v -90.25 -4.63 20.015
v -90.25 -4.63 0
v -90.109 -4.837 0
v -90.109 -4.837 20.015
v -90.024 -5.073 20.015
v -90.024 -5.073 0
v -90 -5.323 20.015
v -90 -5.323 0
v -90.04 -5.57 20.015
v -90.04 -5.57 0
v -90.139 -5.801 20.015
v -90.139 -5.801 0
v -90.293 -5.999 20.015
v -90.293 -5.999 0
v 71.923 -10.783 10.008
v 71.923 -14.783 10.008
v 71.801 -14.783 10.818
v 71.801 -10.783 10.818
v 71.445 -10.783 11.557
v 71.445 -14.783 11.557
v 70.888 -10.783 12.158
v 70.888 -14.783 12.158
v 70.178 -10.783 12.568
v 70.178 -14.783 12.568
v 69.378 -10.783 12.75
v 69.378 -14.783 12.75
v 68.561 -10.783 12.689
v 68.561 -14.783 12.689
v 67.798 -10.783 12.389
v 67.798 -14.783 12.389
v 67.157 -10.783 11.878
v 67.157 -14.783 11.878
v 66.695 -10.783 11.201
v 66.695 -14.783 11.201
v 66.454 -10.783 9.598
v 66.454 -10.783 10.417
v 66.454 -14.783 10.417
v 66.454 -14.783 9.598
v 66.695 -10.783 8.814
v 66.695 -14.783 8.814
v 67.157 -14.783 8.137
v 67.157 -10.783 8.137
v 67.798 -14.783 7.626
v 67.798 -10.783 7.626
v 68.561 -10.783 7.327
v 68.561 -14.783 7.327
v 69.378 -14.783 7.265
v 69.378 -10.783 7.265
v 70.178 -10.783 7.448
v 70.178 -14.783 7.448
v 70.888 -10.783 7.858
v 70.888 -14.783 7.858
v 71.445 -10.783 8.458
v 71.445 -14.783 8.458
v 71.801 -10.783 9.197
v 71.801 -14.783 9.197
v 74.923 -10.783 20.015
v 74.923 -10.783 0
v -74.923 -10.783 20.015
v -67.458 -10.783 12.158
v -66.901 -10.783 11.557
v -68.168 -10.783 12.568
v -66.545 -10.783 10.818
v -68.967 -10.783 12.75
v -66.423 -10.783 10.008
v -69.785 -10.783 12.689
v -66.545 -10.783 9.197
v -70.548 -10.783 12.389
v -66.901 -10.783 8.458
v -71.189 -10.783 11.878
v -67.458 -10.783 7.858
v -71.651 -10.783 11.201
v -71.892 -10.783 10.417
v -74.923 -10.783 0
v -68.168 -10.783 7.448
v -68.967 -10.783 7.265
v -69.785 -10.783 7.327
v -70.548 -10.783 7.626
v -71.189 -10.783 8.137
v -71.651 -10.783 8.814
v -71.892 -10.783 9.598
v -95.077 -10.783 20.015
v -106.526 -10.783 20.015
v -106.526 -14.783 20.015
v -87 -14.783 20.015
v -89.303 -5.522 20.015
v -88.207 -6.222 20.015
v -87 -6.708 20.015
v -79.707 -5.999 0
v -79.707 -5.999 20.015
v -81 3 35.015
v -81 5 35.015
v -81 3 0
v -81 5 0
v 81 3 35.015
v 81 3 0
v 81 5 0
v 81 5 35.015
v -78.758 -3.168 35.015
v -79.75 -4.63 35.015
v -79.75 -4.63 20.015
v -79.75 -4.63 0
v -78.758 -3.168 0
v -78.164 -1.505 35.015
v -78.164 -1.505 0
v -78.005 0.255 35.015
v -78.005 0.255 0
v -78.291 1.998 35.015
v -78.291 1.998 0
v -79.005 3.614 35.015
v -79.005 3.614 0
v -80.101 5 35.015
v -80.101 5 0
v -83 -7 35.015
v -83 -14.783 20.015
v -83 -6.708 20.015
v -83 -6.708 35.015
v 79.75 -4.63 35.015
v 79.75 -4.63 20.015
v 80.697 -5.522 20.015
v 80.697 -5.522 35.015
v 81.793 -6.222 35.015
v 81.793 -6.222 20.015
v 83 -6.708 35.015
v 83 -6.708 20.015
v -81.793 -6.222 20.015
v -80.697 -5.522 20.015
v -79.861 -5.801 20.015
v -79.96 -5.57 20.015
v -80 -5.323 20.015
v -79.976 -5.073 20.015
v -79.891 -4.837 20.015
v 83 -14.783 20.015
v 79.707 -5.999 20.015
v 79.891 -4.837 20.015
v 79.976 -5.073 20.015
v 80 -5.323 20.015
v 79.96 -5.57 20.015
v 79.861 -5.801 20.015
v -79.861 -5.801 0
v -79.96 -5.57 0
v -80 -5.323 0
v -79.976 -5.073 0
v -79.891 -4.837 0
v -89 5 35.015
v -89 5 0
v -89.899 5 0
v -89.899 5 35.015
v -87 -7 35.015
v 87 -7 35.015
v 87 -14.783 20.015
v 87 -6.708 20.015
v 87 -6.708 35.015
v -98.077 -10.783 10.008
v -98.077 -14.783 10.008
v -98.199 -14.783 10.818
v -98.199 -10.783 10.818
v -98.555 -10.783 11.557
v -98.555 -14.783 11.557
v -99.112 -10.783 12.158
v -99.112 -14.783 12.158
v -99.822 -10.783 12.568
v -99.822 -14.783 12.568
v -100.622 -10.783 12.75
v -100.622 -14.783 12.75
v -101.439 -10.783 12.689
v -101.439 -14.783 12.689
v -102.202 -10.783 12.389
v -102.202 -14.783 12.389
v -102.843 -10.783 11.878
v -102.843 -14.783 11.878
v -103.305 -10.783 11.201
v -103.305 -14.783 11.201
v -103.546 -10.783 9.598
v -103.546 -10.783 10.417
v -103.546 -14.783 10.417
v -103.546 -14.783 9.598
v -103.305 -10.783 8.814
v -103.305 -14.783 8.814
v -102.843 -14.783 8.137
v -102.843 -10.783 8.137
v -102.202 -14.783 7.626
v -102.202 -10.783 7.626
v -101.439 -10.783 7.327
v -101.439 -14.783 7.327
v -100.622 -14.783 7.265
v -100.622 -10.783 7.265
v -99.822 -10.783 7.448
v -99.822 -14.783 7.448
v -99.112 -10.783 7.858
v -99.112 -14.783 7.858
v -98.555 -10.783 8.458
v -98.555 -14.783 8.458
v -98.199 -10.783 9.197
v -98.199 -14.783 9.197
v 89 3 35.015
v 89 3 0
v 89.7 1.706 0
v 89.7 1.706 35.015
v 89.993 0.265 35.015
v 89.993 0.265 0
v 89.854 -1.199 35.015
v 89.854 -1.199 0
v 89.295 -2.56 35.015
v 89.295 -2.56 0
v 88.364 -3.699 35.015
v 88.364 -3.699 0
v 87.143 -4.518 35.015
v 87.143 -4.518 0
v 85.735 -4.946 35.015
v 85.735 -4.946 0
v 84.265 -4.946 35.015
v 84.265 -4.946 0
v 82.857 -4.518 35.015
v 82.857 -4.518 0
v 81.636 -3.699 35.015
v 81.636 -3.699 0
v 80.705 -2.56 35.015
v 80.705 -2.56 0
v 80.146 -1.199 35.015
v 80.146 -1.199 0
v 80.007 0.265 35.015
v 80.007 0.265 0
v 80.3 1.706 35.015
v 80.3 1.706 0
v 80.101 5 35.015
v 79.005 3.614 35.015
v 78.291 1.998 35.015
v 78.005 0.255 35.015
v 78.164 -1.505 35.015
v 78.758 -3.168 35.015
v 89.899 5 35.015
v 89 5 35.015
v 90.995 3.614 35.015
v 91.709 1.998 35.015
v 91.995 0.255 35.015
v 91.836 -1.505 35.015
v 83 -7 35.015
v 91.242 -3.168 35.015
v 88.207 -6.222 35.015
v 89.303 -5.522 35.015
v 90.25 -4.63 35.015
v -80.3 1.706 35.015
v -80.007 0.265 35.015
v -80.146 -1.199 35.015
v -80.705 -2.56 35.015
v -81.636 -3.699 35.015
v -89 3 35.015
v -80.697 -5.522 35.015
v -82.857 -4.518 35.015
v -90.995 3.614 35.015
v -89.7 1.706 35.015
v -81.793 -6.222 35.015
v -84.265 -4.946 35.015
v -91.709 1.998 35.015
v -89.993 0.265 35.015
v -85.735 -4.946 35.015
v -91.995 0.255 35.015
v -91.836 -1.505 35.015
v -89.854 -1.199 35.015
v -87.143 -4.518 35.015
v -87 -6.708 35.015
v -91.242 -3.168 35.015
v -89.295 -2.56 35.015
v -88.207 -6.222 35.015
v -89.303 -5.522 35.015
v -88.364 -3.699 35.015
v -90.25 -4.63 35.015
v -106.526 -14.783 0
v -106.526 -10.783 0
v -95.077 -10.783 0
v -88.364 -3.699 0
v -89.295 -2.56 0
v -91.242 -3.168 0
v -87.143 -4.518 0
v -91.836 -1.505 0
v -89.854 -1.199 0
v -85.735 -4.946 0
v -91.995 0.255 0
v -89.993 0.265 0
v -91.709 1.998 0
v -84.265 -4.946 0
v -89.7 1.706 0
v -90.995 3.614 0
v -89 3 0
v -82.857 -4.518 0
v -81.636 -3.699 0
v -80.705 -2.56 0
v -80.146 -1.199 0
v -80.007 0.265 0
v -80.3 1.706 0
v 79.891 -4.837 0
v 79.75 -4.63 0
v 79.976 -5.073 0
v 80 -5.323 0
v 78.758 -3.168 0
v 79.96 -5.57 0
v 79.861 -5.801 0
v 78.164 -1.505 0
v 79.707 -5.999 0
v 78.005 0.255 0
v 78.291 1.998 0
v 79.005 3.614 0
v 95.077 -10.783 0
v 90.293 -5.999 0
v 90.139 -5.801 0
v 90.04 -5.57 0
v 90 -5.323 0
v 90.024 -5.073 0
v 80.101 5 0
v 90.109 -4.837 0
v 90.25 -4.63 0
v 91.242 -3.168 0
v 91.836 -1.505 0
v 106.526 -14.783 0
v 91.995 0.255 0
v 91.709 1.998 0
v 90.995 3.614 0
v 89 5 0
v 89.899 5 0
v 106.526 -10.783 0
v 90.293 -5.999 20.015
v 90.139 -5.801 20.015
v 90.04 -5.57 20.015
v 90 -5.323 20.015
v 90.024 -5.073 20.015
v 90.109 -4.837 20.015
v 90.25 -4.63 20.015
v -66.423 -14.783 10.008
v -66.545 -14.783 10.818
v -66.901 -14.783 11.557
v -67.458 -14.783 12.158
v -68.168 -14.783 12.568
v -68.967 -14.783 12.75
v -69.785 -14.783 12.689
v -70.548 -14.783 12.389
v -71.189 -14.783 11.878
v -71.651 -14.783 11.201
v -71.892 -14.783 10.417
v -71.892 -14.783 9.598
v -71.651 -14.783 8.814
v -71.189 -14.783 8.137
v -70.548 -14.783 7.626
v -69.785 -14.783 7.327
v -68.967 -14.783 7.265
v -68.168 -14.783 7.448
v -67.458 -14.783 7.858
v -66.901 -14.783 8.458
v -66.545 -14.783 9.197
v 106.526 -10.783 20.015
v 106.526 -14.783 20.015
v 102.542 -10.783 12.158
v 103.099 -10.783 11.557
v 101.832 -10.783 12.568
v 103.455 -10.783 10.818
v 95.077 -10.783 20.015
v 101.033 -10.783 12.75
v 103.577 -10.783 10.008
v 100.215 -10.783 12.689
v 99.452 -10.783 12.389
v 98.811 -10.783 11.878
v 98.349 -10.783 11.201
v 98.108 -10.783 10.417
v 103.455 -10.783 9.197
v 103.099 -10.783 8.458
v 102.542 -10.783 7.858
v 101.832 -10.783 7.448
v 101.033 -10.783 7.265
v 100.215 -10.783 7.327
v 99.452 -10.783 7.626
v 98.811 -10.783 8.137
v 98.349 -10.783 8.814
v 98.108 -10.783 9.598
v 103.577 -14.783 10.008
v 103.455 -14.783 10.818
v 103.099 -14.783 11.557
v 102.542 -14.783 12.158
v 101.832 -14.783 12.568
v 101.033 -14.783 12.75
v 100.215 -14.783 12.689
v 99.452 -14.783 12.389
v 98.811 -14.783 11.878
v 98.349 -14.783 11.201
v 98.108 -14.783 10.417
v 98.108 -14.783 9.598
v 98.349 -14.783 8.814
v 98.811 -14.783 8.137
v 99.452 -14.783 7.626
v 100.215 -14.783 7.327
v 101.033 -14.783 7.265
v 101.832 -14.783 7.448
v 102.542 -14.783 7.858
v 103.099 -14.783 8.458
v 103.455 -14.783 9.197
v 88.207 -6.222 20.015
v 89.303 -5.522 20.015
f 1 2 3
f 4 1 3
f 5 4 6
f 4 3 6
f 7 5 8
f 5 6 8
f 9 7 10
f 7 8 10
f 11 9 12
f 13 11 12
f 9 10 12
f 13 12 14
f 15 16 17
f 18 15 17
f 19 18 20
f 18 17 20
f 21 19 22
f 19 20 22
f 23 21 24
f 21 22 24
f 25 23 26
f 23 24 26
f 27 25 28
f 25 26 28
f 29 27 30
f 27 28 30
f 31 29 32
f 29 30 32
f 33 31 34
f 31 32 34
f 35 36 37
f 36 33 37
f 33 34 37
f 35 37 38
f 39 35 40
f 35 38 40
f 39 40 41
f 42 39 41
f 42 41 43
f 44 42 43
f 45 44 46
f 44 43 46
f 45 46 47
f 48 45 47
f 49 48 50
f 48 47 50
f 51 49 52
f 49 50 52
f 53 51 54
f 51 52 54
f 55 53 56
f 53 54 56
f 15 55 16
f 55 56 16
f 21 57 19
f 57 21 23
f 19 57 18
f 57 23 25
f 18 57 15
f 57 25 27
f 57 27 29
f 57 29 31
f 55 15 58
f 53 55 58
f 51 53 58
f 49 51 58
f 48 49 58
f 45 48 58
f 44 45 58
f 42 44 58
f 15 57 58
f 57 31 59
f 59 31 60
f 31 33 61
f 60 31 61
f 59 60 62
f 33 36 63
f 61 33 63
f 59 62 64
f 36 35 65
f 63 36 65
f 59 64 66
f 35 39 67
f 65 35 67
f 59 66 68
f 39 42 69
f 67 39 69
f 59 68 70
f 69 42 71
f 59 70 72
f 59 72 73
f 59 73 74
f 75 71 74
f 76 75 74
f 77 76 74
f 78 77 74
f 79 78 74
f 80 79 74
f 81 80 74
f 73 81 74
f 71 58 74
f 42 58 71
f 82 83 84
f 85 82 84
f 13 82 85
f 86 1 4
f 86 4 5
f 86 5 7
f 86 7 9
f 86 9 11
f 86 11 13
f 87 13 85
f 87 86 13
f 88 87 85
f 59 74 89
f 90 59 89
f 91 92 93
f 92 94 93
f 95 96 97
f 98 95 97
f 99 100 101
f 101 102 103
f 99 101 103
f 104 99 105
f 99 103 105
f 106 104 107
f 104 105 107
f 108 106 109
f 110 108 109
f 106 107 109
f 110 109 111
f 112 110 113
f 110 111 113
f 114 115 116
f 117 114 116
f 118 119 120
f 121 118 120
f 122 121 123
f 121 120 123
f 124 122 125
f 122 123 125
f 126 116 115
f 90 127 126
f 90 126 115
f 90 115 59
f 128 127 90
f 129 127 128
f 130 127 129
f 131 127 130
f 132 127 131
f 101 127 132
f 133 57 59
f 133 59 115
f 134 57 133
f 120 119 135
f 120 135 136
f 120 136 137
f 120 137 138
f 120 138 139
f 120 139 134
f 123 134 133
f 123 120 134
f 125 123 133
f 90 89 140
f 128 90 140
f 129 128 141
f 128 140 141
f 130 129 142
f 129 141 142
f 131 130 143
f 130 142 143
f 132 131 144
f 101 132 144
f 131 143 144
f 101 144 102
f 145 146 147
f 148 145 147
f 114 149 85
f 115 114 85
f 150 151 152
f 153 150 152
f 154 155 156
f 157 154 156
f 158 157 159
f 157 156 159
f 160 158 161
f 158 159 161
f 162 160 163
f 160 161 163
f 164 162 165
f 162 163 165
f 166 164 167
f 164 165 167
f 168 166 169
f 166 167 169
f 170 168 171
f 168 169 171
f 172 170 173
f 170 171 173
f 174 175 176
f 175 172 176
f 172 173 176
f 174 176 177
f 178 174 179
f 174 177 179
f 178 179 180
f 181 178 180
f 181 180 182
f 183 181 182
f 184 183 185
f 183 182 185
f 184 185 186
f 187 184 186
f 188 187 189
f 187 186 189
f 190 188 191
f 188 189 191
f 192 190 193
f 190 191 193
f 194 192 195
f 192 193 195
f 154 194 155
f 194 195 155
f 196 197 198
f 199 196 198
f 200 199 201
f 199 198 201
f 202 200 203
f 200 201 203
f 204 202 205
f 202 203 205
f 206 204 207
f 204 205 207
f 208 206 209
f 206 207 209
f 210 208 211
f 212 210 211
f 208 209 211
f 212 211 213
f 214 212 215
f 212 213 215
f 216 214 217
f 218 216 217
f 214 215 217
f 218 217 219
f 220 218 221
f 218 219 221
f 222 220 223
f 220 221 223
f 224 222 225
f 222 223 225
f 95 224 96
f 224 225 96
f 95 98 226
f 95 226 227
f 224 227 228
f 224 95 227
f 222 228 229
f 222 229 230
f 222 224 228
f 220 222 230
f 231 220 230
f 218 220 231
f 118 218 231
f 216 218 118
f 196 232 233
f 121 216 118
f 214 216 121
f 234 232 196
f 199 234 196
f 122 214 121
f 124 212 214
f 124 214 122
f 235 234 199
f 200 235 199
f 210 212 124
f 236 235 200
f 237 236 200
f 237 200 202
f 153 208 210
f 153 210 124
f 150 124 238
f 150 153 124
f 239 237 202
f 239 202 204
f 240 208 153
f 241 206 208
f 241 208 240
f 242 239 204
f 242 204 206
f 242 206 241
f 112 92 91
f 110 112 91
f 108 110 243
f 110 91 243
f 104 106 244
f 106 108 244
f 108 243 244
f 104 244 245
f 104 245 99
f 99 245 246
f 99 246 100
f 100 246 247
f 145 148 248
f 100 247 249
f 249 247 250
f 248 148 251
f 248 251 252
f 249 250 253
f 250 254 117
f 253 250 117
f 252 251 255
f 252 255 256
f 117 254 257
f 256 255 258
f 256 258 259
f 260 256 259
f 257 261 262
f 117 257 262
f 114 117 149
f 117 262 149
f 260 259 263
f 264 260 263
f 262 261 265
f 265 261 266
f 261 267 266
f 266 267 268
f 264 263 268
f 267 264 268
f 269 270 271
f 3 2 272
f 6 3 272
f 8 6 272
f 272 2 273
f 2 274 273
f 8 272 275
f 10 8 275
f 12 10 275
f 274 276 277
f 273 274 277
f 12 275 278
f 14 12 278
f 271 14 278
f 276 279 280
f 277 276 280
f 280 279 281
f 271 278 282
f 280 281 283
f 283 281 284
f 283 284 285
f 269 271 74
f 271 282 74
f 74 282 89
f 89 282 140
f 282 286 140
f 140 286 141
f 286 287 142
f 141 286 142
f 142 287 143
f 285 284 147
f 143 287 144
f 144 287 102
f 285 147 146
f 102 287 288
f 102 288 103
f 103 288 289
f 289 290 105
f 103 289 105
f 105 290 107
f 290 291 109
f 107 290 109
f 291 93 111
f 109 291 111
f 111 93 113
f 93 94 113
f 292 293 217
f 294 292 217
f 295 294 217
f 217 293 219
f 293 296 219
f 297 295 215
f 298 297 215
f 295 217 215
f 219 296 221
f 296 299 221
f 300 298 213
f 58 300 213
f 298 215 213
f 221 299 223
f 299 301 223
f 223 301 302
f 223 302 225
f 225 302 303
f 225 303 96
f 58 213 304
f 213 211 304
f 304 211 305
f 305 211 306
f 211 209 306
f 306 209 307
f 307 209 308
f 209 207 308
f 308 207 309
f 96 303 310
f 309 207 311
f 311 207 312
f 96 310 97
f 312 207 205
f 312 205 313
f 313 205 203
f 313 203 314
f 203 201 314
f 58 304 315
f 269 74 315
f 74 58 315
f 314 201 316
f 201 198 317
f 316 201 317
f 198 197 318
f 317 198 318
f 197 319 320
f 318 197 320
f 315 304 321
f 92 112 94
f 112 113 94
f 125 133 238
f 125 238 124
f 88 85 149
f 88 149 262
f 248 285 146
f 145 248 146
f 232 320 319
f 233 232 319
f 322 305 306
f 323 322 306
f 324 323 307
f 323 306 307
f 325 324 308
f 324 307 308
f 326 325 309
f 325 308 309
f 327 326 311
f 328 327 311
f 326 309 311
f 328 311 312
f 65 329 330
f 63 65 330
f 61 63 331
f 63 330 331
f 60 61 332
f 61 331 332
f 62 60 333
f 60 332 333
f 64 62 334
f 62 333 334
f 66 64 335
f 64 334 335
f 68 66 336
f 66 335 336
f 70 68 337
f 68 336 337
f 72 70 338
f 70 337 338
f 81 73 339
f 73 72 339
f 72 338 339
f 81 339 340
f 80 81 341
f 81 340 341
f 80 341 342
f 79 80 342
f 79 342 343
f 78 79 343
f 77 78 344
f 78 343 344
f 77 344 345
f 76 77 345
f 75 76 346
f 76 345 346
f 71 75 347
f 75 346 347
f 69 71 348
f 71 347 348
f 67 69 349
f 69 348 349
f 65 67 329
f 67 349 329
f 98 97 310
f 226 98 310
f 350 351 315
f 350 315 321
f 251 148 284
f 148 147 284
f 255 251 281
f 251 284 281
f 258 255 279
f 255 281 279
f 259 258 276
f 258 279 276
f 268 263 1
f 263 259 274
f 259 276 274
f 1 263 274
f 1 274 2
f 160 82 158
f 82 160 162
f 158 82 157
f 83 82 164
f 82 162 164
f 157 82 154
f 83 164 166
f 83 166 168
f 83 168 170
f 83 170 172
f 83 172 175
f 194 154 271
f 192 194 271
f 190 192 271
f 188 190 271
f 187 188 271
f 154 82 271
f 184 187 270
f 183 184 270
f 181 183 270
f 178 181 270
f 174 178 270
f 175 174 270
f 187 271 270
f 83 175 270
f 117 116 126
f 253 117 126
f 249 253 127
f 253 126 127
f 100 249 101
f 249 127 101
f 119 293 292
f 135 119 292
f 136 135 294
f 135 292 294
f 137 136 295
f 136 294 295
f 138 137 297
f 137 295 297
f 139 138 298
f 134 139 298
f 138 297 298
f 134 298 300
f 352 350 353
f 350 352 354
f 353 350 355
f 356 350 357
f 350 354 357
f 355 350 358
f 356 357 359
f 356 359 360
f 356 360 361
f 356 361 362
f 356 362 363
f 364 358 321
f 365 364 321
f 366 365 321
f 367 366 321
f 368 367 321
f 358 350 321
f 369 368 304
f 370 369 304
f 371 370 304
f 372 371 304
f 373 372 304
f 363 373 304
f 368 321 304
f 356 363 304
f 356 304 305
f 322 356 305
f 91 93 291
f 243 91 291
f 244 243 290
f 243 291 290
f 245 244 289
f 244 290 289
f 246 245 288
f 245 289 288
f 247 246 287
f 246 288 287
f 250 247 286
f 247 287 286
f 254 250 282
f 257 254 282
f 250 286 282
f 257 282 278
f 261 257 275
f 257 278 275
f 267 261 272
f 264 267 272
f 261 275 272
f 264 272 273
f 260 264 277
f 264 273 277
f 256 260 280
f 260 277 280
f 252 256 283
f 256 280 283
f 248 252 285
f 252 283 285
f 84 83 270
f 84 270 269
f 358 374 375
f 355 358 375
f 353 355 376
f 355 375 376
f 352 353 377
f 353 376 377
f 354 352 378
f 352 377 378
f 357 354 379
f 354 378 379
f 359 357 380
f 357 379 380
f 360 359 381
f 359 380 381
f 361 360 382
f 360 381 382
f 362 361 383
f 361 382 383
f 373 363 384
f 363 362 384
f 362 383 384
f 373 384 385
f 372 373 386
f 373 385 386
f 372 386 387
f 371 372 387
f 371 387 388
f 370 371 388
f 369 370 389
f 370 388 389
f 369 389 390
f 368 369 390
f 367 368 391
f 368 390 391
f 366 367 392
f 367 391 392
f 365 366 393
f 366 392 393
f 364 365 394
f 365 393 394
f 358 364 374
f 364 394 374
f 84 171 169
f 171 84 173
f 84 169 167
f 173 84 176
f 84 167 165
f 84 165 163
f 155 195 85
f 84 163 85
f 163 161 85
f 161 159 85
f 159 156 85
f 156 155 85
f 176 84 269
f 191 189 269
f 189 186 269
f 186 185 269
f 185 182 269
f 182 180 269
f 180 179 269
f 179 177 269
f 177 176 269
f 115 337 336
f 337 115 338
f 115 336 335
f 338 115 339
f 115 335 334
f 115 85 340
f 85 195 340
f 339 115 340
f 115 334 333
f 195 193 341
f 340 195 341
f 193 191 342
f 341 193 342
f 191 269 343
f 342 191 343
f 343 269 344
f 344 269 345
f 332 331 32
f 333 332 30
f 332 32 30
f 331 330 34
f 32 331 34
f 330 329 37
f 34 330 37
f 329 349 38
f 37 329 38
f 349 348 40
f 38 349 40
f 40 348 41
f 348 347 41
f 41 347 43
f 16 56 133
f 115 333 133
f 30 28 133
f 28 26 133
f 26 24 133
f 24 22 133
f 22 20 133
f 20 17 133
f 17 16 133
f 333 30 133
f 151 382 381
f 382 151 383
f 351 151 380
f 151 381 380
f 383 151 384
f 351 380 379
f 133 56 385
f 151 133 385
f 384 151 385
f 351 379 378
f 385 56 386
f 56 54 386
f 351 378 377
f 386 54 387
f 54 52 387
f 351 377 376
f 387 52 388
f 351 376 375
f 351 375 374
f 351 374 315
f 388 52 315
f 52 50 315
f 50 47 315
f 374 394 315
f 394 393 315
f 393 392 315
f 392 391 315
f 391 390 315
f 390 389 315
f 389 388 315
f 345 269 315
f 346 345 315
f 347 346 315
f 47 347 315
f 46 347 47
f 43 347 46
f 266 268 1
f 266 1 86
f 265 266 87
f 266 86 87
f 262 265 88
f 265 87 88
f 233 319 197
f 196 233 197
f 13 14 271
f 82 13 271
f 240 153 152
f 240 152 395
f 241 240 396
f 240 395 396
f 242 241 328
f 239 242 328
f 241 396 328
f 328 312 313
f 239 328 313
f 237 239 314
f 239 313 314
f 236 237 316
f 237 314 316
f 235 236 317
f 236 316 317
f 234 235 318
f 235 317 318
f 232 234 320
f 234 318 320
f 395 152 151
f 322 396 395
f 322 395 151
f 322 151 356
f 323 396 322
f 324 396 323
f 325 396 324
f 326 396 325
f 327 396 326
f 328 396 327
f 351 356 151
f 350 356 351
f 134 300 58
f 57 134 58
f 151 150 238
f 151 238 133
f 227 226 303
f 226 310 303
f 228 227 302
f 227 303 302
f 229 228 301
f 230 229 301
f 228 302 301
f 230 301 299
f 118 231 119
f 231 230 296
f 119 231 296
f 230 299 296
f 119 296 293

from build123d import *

# Parameters (mm, degrees)
F1_DEPTH = 20.0152
F3_DEPTH = 15
F4_R     = 2.75
F5_DEPTH = 19.7838
F8_DEPTH = 4


with BuildPart() as f1:
    # F0 (on Top) → F1 (new body)
    with BuildSketch(Plane.XY):
        with BuildLine():
            ThreePointArc((-81, 3), (-85, -5), (-89, 3))
            Line((-89, 3), (-89, 5))
            Line((-89, 5), (-89.8989794856, 5))
            ThreePointArc((-89.8989794856, 5), (-91.9953543967, 0.2549840475), (-90.25, -4.6300647944))
            ThreePointArc((-90.25, -4.6300647944), (-90.0004908056, -5.3228294538), (-90.2928932188, -5.9986094033))
            Line((-90.2928932188, -5.9986094033), (-95.0770838155, -10.7828))
            Line((-95.0770838155, -10.7828), (-106.526, -10.7828))
            Line((-106.526, -10.7828), (-106.526, -14.7828))
            Line((-106.526, -14.7828), (106.526, -14.7828))
            Line((106.526, -14.7828), (106.526, -10.7828))
            Line((106.526, -10.7828), (95.0770838155, -10.7828))
            Line((95.0770838155, -10.7828), (90.2928932188, -5.9986094033))
            ThreePointArc((90.2928932188, -5.9986094033), (90.0004908056, -5.3228294538), (90.25, -4.6300647944))
            ThreePointArc((90.25, -4.6300647944), (91.9953543967, 0.2549840475), (89.8989794856, 5))
            Line((89.8989794856, 5), (89, 5))
            Line((89, 5), (89, 3))
            ThreePointArc((89, 3), (85, -5), (81, 3))
            Line((81, 3), (81, 5))
            Line((81, 5), (80.1010205144, 5))
            ThreePointArc((80.1010205144, 5), (78.0046456033, 0.2549840475), (79.75, -4.6300647944))
            ThreePointArc((79.75, -4.6300647944), (79.9995091944, -5.3228294538), (79.7071067812, -5.9986094033))
            Line((79.7071067812, -5.9986094033), (74.9229161845, -10.7828))
            Line((74.9229161845, -10.7828), (-74.9229161845, -10.7828))
            Line((-74.9229161845, -10.7828), (-79.7071067812, -5.9986094033))
            ThreePointArc((-79.7071067812, -5.9986094033), (-79.9995091944, -5.3228294538), (-79.75, -4.6300647944))
            ThreePointArc((-79.75, -4.6300647944), (-78.0046456033, 0.2549840475), (-80.1010205144, 5))
            Line((-80.1010205144, 5), (-81, 5))
            Line((-81, 5), (-81, 3))
        make_face()
    extrude(amount=F1_DEPTH)

    # F2 (on face) → F3 (join)
    with BuildSketch(Plane.XY.offset(20.0152)):
        with BuildLine():
            Line((-89, 5), (-89.8989794856, 5))
            ThreePointArc((-89.8989794856, 5), (-91.9953543967, 0.2549840475), (-90.25, -4.6300647944))
            ThreePointArc((-90.25, -4.6300647944), (-85, -7), (-79.75, -4.6300647944))
            ThreePointArc((-79.75, -4.6300647944), (-78.0046456033, 0.2549840475), (-80.1010205144, 5))
            Line((-80.1010205144, 5), (-81, 5))
            Line((-81, 5), (-81, 3))
            ThreePointArc((-81, 3), (-85, -5), (-89, 3))
            Line((-89, 3), (-89, 5))
        make_face()
        with BuildLine():
            ThreePointArc((80.1010205144, 5), (78.0046456033, 0.2549840475), (79.75, -4.6300647944))
            ThreePointArc((79.75, -4.6300647944), (85, -7), (90.25, -4.6300647944))
            ThreePointArc((90.25, -4.6300647944), (91.9953543967, 0.2549840475), (89.8989794856, 5))
            Line((89.8989794856, 5), (89, 5))
            Line((89, 5), (89, 3))
            ThreePointArc((89, 3), (85, -5), (81, 3))
            Line((81, 3), (81, 5))
            Line((81, 5), (80.1010205144, 5))
        make_face()
    extrude(amount=F3_DEPTH)

    # F4 (on face) → F5 (cut, through all)
    with BuildSketch(Plane.XZ.offset(14.7828)):
        with Locations((-100.8270838155, 10.0076)):
            Circle(F4_R)
        with Locations((-69.1729161845, 10.0076)):
            Circle(F4_R)
        with Locations((69.1729161845, 10.0076)):
            Circle(F4_R)
        with Locations((100.8270838155, 10.0076)):
            Circle(F4_R)
    extrude(amount=-F5_DEPTH, mode=Mode.SUBTRACT)

    # F7 (on offset) → F8 (join)
    with BuildSketch(Plane.YZ.offset(-87)):
        Polygon((-7, 35.0152), (-14.7828, 20.0152), (-6, 20.0152), (-6, 35.0152), align=None)
    extrude(amount=F8_DEPTH)

    # F9: F1 across plane


with BuildPart() as f1_1:
    add(f1.part)
    add(f1.part.mirror(Plane.YZ))


solid = f1_1.part
